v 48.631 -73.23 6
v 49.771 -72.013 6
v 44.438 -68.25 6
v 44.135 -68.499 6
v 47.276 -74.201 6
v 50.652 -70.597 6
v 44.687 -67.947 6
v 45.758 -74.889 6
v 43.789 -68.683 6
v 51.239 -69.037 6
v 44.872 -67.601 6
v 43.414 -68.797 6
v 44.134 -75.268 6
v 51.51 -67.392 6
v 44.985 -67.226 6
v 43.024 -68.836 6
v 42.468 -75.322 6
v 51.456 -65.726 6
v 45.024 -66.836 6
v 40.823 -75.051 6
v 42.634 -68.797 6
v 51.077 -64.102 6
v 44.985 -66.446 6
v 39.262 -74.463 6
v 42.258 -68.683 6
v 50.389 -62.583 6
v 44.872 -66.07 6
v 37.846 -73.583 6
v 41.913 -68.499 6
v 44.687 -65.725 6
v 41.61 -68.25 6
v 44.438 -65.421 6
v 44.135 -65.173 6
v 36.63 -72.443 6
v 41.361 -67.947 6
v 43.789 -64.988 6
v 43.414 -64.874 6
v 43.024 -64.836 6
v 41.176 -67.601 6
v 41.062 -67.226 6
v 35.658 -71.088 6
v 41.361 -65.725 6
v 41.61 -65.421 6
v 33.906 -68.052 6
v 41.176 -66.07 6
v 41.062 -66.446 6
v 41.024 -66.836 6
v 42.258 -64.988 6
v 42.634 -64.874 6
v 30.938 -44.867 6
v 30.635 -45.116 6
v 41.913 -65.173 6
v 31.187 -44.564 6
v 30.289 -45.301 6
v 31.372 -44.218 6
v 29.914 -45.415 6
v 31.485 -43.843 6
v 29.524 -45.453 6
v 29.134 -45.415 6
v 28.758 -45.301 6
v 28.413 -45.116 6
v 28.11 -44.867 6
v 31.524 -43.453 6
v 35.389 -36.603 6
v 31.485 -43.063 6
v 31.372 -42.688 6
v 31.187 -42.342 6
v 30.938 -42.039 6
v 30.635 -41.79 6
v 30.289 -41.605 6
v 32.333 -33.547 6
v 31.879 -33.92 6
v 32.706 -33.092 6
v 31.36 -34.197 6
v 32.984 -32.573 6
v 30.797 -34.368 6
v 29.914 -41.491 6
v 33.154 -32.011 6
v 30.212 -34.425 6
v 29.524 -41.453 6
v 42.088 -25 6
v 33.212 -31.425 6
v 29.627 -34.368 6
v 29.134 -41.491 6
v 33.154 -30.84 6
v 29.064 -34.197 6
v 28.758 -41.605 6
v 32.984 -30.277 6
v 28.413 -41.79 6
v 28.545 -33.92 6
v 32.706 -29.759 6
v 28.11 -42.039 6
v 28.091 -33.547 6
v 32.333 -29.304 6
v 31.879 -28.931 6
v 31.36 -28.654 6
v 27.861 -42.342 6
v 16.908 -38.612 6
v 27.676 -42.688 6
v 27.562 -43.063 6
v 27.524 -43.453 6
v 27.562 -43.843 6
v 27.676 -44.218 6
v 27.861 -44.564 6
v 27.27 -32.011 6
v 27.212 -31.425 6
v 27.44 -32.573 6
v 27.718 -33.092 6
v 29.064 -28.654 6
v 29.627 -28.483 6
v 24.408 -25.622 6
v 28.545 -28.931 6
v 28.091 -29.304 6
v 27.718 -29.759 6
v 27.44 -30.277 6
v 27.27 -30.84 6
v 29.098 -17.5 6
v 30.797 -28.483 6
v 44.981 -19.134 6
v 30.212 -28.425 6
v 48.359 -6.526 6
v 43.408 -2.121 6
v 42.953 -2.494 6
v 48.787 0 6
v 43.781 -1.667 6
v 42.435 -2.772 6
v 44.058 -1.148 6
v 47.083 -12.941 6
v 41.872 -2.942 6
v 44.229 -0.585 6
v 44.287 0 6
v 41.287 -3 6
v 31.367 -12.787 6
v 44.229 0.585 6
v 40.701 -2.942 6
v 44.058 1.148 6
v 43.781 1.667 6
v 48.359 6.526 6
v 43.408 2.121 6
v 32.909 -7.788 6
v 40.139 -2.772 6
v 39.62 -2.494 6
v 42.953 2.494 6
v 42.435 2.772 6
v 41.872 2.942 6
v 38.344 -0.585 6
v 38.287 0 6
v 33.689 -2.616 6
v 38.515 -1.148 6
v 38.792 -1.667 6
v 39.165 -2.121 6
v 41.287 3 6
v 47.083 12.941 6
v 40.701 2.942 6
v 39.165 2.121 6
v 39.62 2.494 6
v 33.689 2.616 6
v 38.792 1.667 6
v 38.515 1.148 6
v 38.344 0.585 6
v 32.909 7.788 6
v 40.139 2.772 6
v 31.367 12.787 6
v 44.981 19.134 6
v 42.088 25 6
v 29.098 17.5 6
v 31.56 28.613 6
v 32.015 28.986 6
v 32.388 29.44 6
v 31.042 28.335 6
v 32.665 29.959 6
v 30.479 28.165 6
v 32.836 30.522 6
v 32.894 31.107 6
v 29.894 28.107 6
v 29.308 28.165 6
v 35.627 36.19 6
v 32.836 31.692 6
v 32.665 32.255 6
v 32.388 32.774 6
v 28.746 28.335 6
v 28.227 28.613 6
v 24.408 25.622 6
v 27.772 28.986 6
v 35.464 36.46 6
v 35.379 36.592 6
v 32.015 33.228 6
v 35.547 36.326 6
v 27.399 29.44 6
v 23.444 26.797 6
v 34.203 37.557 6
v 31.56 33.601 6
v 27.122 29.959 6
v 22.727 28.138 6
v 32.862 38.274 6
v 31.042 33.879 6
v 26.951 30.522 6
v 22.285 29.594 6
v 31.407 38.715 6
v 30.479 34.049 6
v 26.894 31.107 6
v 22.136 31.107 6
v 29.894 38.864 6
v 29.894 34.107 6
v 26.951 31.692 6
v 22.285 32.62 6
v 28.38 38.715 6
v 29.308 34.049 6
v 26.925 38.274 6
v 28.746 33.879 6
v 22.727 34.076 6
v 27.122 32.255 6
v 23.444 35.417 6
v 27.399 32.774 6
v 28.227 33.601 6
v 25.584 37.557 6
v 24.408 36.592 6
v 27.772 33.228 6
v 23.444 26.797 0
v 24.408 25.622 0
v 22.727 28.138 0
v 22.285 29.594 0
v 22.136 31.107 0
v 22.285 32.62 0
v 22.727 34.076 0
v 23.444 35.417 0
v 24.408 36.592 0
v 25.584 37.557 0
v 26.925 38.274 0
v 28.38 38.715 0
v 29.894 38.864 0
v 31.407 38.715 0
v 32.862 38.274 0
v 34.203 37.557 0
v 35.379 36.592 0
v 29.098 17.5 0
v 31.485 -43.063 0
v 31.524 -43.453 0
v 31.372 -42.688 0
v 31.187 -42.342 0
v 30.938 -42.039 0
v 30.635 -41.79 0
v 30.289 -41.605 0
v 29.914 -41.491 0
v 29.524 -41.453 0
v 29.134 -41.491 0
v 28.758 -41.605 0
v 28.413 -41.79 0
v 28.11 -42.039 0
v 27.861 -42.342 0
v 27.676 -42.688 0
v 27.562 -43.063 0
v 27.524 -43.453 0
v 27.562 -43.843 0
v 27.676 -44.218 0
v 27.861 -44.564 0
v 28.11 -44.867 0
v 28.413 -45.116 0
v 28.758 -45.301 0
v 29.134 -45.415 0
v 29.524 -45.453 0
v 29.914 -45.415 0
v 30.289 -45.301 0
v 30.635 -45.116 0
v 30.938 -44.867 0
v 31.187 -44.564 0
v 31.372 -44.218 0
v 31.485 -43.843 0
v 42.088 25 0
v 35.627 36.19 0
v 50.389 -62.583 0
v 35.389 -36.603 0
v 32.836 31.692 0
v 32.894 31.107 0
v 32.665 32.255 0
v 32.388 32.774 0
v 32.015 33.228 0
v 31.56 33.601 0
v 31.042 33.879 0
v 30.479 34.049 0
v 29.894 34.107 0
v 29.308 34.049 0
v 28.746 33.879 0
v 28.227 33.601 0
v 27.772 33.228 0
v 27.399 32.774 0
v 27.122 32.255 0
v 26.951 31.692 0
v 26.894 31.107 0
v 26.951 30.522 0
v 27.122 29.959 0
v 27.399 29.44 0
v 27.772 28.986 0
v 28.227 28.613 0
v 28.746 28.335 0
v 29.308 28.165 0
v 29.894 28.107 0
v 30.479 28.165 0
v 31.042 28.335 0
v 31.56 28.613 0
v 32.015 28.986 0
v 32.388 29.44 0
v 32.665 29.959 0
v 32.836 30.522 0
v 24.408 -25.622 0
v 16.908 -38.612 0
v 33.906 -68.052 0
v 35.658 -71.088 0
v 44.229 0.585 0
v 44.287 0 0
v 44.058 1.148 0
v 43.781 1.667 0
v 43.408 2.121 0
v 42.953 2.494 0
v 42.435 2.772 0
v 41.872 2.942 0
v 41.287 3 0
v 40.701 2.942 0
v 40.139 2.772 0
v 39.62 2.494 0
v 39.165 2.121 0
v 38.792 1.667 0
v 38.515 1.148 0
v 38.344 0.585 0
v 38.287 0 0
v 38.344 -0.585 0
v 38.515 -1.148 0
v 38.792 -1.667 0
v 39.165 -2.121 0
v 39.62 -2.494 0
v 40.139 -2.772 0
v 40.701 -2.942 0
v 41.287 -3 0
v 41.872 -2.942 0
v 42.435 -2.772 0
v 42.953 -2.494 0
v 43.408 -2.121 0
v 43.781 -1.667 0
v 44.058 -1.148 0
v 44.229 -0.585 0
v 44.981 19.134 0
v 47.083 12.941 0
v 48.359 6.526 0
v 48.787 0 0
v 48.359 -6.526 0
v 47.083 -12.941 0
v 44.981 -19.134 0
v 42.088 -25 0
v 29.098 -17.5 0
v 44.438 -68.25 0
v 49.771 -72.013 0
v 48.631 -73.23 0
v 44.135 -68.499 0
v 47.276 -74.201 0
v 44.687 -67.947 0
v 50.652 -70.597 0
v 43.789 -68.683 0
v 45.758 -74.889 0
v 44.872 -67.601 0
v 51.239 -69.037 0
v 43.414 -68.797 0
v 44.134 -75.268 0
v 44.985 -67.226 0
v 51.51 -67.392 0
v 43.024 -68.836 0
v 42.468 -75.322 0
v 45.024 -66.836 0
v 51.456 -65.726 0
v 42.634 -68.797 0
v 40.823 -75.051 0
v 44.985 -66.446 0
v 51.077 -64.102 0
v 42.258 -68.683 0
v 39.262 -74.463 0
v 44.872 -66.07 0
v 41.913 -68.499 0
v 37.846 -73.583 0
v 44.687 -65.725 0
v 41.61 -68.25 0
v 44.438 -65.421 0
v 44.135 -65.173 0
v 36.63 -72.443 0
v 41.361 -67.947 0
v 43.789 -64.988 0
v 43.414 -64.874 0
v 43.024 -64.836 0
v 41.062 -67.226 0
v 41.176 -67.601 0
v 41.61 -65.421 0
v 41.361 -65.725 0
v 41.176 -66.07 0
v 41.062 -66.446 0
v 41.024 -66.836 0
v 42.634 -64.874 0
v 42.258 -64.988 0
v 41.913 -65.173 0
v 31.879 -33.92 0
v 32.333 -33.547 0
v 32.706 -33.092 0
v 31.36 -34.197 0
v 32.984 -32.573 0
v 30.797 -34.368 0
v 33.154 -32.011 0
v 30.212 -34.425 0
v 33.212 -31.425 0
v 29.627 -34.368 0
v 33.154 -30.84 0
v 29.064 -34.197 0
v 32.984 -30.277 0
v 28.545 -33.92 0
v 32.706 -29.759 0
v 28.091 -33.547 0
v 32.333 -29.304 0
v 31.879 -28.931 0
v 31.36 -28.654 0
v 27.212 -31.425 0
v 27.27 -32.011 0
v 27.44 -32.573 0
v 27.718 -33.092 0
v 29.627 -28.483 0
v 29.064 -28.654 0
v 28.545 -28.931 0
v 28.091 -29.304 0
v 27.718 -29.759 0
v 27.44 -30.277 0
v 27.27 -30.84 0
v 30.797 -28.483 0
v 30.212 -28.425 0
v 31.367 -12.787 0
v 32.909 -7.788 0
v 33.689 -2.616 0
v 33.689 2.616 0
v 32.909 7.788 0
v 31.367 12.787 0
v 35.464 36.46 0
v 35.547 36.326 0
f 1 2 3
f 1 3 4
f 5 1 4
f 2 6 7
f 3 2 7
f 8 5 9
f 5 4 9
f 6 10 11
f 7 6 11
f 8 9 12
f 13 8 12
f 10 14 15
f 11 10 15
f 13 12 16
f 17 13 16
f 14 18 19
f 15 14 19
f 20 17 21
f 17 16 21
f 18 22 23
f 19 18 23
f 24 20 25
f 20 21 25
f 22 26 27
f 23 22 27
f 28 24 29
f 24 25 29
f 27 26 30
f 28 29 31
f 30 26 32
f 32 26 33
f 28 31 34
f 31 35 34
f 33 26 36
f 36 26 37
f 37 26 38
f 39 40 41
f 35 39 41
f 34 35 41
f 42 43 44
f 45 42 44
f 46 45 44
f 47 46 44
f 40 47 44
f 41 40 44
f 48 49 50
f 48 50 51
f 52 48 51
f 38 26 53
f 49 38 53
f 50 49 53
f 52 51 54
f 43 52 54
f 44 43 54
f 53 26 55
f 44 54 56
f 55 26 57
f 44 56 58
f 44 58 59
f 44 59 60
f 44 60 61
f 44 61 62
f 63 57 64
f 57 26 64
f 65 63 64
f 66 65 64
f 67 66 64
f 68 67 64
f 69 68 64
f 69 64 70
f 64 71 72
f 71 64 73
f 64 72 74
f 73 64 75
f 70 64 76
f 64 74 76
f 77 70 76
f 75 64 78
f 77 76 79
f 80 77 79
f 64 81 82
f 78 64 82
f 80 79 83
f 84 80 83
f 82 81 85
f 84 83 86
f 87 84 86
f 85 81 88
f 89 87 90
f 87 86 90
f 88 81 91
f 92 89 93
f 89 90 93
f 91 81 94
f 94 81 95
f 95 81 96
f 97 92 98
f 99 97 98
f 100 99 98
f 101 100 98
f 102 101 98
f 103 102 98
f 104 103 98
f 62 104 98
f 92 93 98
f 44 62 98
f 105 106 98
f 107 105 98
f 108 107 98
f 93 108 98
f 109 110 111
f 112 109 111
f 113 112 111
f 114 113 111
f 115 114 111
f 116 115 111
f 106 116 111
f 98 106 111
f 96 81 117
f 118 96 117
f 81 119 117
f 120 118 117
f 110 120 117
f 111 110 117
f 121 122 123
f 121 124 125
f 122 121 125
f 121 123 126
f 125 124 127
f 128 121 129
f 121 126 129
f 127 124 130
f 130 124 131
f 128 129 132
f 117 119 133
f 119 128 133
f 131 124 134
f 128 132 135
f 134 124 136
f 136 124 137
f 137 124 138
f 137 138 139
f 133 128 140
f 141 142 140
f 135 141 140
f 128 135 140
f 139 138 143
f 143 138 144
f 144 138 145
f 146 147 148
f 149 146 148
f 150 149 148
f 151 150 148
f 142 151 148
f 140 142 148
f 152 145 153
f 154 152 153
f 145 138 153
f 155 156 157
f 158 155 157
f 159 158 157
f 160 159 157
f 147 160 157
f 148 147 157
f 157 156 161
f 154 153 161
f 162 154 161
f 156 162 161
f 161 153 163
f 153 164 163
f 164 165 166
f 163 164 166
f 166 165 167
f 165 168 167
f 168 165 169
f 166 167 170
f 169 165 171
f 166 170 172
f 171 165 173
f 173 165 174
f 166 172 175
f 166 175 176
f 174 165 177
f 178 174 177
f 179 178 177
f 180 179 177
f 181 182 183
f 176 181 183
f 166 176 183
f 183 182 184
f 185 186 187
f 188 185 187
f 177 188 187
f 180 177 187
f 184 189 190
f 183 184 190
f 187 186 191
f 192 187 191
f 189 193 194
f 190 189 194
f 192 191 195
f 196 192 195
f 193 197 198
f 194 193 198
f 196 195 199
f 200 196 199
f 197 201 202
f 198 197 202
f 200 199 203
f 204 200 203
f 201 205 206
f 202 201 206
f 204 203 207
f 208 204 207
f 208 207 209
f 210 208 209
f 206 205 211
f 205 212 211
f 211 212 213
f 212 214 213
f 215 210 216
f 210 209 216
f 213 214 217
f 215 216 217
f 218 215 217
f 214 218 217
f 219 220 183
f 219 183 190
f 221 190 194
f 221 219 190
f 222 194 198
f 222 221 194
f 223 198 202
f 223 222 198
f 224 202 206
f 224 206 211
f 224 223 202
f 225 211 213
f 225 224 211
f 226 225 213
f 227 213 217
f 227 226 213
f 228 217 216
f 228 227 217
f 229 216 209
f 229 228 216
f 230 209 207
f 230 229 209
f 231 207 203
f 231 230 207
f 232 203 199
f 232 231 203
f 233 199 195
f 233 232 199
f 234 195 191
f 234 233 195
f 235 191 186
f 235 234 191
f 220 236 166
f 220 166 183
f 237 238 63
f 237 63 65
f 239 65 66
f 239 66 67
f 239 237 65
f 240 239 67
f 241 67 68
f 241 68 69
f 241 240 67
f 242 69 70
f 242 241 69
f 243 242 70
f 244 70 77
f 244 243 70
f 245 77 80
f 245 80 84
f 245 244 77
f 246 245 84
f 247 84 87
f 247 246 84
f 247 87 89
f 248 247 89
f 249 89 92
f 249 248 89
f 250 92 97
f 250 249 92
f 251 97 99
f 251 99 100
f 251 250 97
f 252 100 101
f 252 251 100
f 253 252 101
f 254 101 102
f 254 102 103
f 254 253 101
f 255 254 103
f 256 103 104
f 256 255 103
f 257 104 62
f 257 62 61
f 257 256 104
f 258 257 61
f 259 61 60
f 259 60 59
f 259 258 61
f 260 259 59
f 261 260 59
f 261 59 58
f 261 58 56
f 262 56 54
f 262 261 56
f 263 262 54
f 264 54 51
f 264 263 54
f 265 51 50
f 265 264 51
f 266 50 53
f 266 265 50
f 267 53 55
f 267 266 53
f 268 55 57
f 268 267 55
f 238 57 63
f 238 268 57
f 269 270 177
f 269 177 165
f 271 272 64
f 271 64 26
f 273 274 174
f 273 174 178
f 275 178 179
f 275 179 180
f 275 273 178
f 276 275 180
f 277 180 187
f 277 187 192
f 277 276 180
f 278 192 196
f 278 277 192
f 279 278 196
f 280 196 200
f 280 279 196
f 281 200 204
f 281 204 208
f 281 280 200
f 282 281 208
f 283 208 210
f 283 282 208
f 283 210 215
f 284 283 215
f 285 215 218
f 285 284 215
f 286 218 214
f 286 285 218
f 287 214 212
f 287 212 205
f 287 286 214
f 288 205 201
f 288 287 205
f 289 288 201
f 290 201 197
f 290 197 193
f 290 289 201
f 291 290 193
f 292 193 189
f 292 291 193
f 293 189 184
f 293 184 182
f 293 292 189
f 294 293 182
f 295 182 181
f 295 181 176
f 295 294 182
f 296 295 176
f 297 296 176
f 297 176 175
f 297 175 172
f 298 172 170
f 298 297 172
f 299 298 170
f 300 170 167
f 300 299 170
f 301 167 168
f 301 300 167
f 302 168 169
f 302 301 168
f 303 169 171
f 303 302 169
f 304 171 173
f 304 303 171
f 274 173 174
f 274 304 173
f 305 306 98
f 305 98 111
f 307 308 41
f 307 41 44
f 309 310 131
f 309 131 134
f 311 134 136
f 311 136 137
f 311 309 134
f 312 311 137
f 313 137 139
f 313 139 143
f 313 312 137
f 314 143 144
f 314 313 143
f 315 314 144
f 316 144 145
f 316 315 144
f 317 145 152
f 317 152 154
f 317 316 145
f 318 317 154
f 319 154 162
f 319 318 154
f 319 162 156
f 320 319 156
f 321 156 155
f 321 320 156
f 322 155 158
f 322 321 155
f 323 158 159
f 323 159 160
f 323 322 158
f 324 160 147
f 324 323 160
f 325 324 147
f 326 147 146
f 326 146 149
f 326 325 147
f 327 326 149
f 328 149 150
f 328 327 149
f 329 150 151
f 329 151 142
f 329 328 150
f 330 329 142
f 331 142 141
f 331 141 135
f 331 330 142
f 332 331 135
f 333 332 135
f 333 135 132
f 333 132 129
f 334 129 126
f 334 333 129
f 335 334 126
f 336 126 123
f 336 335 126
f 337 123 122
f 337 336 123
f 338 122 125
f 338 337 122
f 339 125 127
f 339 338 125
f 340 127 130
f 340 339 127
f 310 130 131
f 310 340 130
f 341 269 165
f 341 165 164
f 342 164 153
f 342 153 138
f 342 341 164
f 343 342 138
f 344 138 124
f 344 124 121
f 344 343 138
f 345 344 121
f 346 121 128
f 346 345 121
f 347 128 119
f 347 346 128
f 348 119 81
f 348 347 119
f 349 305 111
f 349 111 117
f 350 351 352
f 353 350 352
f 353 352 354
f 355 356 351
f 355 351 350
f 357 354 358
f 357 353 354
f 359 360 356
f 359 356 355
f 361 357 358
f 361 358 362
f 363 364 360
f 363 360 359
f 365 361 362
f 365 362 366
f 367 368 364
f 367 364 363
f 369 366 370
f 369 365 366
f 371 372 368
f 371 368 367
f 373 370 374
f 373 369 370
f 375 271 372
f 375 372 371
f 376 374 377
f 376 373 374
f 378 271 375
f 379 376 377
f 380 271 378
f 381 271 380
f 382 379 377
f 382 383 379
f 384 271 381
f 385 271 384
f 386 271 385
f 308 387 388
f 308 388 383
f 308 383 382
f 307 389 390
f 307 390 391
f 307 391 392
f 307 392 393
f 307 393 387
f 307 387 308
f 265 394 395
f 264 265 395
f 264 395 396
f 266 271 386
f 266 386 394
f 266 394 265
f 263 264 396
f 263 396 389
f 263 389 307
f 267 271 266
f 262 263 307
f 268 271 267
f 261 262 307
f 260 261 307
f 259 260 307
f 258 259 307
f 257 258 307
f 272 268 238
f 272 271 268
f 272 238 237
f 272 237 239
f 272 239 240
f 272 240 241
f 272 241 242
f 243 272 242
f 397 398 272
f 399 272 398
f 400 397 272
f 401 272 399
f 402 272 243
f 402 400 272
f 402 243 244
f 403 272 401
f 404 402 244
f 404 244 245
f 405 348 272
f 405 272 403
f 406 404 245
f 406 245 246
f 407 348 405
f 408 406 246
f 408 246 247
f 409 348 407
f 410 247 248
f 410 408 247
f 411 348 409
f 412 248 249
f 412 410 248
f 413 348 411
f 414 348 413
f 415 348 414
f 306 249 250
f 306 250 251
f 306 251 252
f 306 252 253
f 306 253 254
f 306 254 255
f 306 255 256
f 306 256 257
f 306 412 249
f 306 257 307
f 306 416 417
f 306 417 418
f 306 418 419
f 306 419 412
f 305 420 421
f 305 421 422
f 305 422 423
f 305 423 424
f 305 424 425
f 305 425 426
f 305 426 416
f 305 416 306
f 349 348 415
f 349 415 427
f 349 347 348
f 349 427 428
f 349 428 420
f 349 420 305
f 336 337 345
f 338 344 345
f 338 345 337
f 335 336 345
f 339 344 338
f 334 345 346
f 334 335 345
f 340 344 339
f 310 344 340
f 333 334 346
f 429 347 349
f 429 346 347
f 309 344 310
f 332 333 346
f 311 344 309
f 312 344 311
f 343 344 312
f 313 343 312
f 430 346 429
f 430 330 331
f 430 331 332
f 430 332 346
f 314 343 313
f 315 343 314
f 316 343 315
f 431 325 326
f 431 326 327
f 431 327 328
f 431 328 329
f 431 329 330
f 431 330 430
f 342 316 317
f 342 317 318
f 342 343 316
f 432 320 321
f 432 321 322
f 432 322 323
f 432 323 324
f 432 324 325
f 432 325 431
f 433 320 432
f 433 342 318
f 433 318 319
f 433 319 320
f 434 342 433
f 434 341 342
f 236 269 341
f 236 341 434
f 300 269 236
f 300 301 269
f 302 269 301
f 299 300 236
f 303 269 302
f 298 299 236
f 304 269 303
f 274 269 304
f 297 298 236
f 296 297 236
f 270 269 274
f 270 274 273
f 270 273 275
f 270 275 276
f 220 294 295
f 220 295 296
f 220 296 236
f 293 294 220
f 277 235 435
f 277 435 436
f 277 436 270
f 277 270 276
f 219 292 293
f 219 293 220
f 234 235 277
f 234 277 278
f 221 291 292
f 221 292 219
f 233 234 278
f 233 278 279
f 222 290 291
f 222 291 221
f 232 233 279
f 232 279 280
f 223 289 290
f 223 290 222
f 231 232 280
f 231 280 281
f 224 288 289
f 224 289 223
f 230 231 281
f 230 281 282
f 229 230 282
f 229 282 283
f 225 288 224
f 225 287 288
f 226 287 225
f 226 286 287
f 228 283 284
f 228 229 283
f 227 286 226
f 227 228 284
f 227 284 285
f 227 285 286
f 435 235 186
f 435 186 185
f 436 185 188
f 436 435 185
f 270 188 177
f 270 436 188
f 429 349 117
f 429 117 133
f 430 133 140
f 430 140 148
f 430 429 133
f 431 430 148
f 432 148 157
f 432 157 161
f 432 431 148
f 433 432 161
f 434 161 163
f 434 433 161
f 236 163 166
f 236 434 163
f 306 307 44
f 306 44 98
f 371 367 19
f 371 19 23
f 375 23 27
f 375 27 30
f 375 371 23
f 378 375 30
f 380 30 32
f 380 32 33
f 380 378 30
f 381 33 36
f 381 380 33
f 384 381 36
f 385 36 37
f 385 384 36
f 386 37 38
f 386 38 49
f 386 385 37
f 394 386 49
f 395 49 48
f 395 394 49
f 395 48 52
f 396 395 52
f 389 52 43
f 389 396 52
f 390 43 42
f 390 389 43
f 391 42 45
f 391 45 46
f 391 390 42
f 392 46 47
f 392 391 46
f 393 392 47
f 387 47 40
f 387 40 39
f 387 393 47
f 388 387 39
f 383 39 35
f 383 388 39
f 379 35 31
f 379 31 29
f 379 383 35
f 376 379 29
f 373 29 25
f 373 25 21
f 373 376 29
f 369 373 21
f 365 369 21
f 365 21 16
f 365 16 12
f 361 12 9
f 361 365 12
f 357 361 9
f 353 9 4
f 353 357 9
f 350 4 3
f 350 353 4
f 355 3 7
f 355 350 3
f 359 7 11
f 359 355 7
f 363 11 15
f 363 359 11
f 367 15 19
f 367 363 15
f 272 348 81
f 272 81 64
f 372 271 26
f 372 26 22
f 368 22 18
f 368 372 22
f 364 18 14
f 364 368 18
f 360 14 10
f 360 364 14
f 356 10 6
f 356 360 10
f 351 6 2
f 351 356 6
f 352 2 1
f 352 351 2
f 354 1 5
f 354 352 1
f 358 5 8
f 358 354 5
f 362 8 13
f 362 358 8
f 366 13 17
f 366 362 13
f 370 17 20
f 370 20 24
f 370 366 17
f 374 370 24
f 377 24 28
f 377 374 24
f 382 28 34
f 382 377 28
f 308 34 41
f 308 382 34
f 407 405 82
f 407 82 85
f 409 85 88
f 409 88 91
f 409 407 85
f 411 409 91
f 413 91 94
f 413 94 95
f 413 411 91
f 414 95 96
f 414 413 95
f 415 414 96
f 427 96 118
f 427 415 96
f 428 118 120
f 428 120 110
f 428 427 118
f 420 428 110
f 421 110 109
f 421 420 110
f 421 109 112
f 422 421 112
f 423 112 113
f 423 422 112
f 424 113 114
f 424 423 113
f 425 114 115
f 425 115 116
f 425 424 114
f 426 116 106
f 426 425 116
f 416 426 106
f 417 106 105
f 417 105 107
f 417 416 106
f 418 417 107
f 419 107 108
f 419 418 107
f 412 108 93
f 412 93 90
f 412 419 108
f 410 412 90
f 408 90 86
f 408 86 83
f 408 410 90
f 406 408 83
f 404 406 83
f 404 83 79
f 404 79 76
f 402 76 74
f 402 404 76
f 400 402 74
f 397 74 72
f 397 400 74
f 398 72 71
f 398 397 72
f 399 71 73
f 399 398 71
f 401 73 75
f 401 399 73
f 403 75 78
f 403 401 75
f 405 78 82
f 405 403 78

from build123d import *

# Parameters (mm, degrees)
SKETCH1_R           = 3
SKETCH1_R_2         = 2
BOSS_EXTRUDE1_DEPTH = 6


with BuildPart() as part:
    # Sketch1 → Boss-Extrude1 (new body)
    with BuildSketch(Plane.XY):
        with BuildLine():
            ThreePointArc((24.40844793, 25.621778265), (24.40844793, 36.592231664), (35.378901329, 36.592231664))
            ThreePointArc((35.378901329, 36.592231664), (35.506003821, 36.393205072), (35.627115001, 36.190476904))
            Line((35.627115001, 36.190476904), (42.087939854, 25))
            ThreePointArc((42.087939854, 25), (48.786669665, 0), (42.087939854, -25))
            Line((42.087939854, -25), (35.389210043, -36.602540378))
            Line((35.389210043, -36.602540378), (50.389210043, -62.583302492))
            ThreePointArc((50.389210043, -62.583302492), (47.276233722, -74.201088285), (35.65844793, -71.088111964))
            Line((35.65844793, -71.088111964), (33.905802512, -68.052441052))
            Line((33.905802512, -68.052441052), (16.90844793, -38.612159322))
            Line((16.90844793, -38.612159322), (24.40844793, -25.621778265))
            Line((24.40844793, -25.621778265), (29.097558797, -17.5))
            ThreePointArc((29.097558797, -17.5), (33.786669665, 0), (29.097558797, 17.5))
            Line((29.097558797, 17.5), (24.40844793, 25.621778265))
        make_face()
        with Locations((29.893674629, 31.107004965)):
            Circle(SKETCH1_R, mode=Mode.SUBTRACT)
        with Locations((30.212002479, -31.425332814)):
            Circle(SKETCH1_R, mode=Mode.SUBTRACT)
        with Locations((43.023828987, -66.835707228)):
            Circle(SKETCH1_R_2, mode=Mode.SUBTRACT)
        with Locations((41.286669665, 0)):
            Circle(SKETCH1_R, mode=Mode.SUBTRACT)
        with Locations((29.523828987, -43.453021326)):
            Circle(SKETCH1_R_2, mode=Mode.SUBTRACT)
    extrude(amount=BOSS_EXTRUDE1_DEPTH)


solid = part.part
